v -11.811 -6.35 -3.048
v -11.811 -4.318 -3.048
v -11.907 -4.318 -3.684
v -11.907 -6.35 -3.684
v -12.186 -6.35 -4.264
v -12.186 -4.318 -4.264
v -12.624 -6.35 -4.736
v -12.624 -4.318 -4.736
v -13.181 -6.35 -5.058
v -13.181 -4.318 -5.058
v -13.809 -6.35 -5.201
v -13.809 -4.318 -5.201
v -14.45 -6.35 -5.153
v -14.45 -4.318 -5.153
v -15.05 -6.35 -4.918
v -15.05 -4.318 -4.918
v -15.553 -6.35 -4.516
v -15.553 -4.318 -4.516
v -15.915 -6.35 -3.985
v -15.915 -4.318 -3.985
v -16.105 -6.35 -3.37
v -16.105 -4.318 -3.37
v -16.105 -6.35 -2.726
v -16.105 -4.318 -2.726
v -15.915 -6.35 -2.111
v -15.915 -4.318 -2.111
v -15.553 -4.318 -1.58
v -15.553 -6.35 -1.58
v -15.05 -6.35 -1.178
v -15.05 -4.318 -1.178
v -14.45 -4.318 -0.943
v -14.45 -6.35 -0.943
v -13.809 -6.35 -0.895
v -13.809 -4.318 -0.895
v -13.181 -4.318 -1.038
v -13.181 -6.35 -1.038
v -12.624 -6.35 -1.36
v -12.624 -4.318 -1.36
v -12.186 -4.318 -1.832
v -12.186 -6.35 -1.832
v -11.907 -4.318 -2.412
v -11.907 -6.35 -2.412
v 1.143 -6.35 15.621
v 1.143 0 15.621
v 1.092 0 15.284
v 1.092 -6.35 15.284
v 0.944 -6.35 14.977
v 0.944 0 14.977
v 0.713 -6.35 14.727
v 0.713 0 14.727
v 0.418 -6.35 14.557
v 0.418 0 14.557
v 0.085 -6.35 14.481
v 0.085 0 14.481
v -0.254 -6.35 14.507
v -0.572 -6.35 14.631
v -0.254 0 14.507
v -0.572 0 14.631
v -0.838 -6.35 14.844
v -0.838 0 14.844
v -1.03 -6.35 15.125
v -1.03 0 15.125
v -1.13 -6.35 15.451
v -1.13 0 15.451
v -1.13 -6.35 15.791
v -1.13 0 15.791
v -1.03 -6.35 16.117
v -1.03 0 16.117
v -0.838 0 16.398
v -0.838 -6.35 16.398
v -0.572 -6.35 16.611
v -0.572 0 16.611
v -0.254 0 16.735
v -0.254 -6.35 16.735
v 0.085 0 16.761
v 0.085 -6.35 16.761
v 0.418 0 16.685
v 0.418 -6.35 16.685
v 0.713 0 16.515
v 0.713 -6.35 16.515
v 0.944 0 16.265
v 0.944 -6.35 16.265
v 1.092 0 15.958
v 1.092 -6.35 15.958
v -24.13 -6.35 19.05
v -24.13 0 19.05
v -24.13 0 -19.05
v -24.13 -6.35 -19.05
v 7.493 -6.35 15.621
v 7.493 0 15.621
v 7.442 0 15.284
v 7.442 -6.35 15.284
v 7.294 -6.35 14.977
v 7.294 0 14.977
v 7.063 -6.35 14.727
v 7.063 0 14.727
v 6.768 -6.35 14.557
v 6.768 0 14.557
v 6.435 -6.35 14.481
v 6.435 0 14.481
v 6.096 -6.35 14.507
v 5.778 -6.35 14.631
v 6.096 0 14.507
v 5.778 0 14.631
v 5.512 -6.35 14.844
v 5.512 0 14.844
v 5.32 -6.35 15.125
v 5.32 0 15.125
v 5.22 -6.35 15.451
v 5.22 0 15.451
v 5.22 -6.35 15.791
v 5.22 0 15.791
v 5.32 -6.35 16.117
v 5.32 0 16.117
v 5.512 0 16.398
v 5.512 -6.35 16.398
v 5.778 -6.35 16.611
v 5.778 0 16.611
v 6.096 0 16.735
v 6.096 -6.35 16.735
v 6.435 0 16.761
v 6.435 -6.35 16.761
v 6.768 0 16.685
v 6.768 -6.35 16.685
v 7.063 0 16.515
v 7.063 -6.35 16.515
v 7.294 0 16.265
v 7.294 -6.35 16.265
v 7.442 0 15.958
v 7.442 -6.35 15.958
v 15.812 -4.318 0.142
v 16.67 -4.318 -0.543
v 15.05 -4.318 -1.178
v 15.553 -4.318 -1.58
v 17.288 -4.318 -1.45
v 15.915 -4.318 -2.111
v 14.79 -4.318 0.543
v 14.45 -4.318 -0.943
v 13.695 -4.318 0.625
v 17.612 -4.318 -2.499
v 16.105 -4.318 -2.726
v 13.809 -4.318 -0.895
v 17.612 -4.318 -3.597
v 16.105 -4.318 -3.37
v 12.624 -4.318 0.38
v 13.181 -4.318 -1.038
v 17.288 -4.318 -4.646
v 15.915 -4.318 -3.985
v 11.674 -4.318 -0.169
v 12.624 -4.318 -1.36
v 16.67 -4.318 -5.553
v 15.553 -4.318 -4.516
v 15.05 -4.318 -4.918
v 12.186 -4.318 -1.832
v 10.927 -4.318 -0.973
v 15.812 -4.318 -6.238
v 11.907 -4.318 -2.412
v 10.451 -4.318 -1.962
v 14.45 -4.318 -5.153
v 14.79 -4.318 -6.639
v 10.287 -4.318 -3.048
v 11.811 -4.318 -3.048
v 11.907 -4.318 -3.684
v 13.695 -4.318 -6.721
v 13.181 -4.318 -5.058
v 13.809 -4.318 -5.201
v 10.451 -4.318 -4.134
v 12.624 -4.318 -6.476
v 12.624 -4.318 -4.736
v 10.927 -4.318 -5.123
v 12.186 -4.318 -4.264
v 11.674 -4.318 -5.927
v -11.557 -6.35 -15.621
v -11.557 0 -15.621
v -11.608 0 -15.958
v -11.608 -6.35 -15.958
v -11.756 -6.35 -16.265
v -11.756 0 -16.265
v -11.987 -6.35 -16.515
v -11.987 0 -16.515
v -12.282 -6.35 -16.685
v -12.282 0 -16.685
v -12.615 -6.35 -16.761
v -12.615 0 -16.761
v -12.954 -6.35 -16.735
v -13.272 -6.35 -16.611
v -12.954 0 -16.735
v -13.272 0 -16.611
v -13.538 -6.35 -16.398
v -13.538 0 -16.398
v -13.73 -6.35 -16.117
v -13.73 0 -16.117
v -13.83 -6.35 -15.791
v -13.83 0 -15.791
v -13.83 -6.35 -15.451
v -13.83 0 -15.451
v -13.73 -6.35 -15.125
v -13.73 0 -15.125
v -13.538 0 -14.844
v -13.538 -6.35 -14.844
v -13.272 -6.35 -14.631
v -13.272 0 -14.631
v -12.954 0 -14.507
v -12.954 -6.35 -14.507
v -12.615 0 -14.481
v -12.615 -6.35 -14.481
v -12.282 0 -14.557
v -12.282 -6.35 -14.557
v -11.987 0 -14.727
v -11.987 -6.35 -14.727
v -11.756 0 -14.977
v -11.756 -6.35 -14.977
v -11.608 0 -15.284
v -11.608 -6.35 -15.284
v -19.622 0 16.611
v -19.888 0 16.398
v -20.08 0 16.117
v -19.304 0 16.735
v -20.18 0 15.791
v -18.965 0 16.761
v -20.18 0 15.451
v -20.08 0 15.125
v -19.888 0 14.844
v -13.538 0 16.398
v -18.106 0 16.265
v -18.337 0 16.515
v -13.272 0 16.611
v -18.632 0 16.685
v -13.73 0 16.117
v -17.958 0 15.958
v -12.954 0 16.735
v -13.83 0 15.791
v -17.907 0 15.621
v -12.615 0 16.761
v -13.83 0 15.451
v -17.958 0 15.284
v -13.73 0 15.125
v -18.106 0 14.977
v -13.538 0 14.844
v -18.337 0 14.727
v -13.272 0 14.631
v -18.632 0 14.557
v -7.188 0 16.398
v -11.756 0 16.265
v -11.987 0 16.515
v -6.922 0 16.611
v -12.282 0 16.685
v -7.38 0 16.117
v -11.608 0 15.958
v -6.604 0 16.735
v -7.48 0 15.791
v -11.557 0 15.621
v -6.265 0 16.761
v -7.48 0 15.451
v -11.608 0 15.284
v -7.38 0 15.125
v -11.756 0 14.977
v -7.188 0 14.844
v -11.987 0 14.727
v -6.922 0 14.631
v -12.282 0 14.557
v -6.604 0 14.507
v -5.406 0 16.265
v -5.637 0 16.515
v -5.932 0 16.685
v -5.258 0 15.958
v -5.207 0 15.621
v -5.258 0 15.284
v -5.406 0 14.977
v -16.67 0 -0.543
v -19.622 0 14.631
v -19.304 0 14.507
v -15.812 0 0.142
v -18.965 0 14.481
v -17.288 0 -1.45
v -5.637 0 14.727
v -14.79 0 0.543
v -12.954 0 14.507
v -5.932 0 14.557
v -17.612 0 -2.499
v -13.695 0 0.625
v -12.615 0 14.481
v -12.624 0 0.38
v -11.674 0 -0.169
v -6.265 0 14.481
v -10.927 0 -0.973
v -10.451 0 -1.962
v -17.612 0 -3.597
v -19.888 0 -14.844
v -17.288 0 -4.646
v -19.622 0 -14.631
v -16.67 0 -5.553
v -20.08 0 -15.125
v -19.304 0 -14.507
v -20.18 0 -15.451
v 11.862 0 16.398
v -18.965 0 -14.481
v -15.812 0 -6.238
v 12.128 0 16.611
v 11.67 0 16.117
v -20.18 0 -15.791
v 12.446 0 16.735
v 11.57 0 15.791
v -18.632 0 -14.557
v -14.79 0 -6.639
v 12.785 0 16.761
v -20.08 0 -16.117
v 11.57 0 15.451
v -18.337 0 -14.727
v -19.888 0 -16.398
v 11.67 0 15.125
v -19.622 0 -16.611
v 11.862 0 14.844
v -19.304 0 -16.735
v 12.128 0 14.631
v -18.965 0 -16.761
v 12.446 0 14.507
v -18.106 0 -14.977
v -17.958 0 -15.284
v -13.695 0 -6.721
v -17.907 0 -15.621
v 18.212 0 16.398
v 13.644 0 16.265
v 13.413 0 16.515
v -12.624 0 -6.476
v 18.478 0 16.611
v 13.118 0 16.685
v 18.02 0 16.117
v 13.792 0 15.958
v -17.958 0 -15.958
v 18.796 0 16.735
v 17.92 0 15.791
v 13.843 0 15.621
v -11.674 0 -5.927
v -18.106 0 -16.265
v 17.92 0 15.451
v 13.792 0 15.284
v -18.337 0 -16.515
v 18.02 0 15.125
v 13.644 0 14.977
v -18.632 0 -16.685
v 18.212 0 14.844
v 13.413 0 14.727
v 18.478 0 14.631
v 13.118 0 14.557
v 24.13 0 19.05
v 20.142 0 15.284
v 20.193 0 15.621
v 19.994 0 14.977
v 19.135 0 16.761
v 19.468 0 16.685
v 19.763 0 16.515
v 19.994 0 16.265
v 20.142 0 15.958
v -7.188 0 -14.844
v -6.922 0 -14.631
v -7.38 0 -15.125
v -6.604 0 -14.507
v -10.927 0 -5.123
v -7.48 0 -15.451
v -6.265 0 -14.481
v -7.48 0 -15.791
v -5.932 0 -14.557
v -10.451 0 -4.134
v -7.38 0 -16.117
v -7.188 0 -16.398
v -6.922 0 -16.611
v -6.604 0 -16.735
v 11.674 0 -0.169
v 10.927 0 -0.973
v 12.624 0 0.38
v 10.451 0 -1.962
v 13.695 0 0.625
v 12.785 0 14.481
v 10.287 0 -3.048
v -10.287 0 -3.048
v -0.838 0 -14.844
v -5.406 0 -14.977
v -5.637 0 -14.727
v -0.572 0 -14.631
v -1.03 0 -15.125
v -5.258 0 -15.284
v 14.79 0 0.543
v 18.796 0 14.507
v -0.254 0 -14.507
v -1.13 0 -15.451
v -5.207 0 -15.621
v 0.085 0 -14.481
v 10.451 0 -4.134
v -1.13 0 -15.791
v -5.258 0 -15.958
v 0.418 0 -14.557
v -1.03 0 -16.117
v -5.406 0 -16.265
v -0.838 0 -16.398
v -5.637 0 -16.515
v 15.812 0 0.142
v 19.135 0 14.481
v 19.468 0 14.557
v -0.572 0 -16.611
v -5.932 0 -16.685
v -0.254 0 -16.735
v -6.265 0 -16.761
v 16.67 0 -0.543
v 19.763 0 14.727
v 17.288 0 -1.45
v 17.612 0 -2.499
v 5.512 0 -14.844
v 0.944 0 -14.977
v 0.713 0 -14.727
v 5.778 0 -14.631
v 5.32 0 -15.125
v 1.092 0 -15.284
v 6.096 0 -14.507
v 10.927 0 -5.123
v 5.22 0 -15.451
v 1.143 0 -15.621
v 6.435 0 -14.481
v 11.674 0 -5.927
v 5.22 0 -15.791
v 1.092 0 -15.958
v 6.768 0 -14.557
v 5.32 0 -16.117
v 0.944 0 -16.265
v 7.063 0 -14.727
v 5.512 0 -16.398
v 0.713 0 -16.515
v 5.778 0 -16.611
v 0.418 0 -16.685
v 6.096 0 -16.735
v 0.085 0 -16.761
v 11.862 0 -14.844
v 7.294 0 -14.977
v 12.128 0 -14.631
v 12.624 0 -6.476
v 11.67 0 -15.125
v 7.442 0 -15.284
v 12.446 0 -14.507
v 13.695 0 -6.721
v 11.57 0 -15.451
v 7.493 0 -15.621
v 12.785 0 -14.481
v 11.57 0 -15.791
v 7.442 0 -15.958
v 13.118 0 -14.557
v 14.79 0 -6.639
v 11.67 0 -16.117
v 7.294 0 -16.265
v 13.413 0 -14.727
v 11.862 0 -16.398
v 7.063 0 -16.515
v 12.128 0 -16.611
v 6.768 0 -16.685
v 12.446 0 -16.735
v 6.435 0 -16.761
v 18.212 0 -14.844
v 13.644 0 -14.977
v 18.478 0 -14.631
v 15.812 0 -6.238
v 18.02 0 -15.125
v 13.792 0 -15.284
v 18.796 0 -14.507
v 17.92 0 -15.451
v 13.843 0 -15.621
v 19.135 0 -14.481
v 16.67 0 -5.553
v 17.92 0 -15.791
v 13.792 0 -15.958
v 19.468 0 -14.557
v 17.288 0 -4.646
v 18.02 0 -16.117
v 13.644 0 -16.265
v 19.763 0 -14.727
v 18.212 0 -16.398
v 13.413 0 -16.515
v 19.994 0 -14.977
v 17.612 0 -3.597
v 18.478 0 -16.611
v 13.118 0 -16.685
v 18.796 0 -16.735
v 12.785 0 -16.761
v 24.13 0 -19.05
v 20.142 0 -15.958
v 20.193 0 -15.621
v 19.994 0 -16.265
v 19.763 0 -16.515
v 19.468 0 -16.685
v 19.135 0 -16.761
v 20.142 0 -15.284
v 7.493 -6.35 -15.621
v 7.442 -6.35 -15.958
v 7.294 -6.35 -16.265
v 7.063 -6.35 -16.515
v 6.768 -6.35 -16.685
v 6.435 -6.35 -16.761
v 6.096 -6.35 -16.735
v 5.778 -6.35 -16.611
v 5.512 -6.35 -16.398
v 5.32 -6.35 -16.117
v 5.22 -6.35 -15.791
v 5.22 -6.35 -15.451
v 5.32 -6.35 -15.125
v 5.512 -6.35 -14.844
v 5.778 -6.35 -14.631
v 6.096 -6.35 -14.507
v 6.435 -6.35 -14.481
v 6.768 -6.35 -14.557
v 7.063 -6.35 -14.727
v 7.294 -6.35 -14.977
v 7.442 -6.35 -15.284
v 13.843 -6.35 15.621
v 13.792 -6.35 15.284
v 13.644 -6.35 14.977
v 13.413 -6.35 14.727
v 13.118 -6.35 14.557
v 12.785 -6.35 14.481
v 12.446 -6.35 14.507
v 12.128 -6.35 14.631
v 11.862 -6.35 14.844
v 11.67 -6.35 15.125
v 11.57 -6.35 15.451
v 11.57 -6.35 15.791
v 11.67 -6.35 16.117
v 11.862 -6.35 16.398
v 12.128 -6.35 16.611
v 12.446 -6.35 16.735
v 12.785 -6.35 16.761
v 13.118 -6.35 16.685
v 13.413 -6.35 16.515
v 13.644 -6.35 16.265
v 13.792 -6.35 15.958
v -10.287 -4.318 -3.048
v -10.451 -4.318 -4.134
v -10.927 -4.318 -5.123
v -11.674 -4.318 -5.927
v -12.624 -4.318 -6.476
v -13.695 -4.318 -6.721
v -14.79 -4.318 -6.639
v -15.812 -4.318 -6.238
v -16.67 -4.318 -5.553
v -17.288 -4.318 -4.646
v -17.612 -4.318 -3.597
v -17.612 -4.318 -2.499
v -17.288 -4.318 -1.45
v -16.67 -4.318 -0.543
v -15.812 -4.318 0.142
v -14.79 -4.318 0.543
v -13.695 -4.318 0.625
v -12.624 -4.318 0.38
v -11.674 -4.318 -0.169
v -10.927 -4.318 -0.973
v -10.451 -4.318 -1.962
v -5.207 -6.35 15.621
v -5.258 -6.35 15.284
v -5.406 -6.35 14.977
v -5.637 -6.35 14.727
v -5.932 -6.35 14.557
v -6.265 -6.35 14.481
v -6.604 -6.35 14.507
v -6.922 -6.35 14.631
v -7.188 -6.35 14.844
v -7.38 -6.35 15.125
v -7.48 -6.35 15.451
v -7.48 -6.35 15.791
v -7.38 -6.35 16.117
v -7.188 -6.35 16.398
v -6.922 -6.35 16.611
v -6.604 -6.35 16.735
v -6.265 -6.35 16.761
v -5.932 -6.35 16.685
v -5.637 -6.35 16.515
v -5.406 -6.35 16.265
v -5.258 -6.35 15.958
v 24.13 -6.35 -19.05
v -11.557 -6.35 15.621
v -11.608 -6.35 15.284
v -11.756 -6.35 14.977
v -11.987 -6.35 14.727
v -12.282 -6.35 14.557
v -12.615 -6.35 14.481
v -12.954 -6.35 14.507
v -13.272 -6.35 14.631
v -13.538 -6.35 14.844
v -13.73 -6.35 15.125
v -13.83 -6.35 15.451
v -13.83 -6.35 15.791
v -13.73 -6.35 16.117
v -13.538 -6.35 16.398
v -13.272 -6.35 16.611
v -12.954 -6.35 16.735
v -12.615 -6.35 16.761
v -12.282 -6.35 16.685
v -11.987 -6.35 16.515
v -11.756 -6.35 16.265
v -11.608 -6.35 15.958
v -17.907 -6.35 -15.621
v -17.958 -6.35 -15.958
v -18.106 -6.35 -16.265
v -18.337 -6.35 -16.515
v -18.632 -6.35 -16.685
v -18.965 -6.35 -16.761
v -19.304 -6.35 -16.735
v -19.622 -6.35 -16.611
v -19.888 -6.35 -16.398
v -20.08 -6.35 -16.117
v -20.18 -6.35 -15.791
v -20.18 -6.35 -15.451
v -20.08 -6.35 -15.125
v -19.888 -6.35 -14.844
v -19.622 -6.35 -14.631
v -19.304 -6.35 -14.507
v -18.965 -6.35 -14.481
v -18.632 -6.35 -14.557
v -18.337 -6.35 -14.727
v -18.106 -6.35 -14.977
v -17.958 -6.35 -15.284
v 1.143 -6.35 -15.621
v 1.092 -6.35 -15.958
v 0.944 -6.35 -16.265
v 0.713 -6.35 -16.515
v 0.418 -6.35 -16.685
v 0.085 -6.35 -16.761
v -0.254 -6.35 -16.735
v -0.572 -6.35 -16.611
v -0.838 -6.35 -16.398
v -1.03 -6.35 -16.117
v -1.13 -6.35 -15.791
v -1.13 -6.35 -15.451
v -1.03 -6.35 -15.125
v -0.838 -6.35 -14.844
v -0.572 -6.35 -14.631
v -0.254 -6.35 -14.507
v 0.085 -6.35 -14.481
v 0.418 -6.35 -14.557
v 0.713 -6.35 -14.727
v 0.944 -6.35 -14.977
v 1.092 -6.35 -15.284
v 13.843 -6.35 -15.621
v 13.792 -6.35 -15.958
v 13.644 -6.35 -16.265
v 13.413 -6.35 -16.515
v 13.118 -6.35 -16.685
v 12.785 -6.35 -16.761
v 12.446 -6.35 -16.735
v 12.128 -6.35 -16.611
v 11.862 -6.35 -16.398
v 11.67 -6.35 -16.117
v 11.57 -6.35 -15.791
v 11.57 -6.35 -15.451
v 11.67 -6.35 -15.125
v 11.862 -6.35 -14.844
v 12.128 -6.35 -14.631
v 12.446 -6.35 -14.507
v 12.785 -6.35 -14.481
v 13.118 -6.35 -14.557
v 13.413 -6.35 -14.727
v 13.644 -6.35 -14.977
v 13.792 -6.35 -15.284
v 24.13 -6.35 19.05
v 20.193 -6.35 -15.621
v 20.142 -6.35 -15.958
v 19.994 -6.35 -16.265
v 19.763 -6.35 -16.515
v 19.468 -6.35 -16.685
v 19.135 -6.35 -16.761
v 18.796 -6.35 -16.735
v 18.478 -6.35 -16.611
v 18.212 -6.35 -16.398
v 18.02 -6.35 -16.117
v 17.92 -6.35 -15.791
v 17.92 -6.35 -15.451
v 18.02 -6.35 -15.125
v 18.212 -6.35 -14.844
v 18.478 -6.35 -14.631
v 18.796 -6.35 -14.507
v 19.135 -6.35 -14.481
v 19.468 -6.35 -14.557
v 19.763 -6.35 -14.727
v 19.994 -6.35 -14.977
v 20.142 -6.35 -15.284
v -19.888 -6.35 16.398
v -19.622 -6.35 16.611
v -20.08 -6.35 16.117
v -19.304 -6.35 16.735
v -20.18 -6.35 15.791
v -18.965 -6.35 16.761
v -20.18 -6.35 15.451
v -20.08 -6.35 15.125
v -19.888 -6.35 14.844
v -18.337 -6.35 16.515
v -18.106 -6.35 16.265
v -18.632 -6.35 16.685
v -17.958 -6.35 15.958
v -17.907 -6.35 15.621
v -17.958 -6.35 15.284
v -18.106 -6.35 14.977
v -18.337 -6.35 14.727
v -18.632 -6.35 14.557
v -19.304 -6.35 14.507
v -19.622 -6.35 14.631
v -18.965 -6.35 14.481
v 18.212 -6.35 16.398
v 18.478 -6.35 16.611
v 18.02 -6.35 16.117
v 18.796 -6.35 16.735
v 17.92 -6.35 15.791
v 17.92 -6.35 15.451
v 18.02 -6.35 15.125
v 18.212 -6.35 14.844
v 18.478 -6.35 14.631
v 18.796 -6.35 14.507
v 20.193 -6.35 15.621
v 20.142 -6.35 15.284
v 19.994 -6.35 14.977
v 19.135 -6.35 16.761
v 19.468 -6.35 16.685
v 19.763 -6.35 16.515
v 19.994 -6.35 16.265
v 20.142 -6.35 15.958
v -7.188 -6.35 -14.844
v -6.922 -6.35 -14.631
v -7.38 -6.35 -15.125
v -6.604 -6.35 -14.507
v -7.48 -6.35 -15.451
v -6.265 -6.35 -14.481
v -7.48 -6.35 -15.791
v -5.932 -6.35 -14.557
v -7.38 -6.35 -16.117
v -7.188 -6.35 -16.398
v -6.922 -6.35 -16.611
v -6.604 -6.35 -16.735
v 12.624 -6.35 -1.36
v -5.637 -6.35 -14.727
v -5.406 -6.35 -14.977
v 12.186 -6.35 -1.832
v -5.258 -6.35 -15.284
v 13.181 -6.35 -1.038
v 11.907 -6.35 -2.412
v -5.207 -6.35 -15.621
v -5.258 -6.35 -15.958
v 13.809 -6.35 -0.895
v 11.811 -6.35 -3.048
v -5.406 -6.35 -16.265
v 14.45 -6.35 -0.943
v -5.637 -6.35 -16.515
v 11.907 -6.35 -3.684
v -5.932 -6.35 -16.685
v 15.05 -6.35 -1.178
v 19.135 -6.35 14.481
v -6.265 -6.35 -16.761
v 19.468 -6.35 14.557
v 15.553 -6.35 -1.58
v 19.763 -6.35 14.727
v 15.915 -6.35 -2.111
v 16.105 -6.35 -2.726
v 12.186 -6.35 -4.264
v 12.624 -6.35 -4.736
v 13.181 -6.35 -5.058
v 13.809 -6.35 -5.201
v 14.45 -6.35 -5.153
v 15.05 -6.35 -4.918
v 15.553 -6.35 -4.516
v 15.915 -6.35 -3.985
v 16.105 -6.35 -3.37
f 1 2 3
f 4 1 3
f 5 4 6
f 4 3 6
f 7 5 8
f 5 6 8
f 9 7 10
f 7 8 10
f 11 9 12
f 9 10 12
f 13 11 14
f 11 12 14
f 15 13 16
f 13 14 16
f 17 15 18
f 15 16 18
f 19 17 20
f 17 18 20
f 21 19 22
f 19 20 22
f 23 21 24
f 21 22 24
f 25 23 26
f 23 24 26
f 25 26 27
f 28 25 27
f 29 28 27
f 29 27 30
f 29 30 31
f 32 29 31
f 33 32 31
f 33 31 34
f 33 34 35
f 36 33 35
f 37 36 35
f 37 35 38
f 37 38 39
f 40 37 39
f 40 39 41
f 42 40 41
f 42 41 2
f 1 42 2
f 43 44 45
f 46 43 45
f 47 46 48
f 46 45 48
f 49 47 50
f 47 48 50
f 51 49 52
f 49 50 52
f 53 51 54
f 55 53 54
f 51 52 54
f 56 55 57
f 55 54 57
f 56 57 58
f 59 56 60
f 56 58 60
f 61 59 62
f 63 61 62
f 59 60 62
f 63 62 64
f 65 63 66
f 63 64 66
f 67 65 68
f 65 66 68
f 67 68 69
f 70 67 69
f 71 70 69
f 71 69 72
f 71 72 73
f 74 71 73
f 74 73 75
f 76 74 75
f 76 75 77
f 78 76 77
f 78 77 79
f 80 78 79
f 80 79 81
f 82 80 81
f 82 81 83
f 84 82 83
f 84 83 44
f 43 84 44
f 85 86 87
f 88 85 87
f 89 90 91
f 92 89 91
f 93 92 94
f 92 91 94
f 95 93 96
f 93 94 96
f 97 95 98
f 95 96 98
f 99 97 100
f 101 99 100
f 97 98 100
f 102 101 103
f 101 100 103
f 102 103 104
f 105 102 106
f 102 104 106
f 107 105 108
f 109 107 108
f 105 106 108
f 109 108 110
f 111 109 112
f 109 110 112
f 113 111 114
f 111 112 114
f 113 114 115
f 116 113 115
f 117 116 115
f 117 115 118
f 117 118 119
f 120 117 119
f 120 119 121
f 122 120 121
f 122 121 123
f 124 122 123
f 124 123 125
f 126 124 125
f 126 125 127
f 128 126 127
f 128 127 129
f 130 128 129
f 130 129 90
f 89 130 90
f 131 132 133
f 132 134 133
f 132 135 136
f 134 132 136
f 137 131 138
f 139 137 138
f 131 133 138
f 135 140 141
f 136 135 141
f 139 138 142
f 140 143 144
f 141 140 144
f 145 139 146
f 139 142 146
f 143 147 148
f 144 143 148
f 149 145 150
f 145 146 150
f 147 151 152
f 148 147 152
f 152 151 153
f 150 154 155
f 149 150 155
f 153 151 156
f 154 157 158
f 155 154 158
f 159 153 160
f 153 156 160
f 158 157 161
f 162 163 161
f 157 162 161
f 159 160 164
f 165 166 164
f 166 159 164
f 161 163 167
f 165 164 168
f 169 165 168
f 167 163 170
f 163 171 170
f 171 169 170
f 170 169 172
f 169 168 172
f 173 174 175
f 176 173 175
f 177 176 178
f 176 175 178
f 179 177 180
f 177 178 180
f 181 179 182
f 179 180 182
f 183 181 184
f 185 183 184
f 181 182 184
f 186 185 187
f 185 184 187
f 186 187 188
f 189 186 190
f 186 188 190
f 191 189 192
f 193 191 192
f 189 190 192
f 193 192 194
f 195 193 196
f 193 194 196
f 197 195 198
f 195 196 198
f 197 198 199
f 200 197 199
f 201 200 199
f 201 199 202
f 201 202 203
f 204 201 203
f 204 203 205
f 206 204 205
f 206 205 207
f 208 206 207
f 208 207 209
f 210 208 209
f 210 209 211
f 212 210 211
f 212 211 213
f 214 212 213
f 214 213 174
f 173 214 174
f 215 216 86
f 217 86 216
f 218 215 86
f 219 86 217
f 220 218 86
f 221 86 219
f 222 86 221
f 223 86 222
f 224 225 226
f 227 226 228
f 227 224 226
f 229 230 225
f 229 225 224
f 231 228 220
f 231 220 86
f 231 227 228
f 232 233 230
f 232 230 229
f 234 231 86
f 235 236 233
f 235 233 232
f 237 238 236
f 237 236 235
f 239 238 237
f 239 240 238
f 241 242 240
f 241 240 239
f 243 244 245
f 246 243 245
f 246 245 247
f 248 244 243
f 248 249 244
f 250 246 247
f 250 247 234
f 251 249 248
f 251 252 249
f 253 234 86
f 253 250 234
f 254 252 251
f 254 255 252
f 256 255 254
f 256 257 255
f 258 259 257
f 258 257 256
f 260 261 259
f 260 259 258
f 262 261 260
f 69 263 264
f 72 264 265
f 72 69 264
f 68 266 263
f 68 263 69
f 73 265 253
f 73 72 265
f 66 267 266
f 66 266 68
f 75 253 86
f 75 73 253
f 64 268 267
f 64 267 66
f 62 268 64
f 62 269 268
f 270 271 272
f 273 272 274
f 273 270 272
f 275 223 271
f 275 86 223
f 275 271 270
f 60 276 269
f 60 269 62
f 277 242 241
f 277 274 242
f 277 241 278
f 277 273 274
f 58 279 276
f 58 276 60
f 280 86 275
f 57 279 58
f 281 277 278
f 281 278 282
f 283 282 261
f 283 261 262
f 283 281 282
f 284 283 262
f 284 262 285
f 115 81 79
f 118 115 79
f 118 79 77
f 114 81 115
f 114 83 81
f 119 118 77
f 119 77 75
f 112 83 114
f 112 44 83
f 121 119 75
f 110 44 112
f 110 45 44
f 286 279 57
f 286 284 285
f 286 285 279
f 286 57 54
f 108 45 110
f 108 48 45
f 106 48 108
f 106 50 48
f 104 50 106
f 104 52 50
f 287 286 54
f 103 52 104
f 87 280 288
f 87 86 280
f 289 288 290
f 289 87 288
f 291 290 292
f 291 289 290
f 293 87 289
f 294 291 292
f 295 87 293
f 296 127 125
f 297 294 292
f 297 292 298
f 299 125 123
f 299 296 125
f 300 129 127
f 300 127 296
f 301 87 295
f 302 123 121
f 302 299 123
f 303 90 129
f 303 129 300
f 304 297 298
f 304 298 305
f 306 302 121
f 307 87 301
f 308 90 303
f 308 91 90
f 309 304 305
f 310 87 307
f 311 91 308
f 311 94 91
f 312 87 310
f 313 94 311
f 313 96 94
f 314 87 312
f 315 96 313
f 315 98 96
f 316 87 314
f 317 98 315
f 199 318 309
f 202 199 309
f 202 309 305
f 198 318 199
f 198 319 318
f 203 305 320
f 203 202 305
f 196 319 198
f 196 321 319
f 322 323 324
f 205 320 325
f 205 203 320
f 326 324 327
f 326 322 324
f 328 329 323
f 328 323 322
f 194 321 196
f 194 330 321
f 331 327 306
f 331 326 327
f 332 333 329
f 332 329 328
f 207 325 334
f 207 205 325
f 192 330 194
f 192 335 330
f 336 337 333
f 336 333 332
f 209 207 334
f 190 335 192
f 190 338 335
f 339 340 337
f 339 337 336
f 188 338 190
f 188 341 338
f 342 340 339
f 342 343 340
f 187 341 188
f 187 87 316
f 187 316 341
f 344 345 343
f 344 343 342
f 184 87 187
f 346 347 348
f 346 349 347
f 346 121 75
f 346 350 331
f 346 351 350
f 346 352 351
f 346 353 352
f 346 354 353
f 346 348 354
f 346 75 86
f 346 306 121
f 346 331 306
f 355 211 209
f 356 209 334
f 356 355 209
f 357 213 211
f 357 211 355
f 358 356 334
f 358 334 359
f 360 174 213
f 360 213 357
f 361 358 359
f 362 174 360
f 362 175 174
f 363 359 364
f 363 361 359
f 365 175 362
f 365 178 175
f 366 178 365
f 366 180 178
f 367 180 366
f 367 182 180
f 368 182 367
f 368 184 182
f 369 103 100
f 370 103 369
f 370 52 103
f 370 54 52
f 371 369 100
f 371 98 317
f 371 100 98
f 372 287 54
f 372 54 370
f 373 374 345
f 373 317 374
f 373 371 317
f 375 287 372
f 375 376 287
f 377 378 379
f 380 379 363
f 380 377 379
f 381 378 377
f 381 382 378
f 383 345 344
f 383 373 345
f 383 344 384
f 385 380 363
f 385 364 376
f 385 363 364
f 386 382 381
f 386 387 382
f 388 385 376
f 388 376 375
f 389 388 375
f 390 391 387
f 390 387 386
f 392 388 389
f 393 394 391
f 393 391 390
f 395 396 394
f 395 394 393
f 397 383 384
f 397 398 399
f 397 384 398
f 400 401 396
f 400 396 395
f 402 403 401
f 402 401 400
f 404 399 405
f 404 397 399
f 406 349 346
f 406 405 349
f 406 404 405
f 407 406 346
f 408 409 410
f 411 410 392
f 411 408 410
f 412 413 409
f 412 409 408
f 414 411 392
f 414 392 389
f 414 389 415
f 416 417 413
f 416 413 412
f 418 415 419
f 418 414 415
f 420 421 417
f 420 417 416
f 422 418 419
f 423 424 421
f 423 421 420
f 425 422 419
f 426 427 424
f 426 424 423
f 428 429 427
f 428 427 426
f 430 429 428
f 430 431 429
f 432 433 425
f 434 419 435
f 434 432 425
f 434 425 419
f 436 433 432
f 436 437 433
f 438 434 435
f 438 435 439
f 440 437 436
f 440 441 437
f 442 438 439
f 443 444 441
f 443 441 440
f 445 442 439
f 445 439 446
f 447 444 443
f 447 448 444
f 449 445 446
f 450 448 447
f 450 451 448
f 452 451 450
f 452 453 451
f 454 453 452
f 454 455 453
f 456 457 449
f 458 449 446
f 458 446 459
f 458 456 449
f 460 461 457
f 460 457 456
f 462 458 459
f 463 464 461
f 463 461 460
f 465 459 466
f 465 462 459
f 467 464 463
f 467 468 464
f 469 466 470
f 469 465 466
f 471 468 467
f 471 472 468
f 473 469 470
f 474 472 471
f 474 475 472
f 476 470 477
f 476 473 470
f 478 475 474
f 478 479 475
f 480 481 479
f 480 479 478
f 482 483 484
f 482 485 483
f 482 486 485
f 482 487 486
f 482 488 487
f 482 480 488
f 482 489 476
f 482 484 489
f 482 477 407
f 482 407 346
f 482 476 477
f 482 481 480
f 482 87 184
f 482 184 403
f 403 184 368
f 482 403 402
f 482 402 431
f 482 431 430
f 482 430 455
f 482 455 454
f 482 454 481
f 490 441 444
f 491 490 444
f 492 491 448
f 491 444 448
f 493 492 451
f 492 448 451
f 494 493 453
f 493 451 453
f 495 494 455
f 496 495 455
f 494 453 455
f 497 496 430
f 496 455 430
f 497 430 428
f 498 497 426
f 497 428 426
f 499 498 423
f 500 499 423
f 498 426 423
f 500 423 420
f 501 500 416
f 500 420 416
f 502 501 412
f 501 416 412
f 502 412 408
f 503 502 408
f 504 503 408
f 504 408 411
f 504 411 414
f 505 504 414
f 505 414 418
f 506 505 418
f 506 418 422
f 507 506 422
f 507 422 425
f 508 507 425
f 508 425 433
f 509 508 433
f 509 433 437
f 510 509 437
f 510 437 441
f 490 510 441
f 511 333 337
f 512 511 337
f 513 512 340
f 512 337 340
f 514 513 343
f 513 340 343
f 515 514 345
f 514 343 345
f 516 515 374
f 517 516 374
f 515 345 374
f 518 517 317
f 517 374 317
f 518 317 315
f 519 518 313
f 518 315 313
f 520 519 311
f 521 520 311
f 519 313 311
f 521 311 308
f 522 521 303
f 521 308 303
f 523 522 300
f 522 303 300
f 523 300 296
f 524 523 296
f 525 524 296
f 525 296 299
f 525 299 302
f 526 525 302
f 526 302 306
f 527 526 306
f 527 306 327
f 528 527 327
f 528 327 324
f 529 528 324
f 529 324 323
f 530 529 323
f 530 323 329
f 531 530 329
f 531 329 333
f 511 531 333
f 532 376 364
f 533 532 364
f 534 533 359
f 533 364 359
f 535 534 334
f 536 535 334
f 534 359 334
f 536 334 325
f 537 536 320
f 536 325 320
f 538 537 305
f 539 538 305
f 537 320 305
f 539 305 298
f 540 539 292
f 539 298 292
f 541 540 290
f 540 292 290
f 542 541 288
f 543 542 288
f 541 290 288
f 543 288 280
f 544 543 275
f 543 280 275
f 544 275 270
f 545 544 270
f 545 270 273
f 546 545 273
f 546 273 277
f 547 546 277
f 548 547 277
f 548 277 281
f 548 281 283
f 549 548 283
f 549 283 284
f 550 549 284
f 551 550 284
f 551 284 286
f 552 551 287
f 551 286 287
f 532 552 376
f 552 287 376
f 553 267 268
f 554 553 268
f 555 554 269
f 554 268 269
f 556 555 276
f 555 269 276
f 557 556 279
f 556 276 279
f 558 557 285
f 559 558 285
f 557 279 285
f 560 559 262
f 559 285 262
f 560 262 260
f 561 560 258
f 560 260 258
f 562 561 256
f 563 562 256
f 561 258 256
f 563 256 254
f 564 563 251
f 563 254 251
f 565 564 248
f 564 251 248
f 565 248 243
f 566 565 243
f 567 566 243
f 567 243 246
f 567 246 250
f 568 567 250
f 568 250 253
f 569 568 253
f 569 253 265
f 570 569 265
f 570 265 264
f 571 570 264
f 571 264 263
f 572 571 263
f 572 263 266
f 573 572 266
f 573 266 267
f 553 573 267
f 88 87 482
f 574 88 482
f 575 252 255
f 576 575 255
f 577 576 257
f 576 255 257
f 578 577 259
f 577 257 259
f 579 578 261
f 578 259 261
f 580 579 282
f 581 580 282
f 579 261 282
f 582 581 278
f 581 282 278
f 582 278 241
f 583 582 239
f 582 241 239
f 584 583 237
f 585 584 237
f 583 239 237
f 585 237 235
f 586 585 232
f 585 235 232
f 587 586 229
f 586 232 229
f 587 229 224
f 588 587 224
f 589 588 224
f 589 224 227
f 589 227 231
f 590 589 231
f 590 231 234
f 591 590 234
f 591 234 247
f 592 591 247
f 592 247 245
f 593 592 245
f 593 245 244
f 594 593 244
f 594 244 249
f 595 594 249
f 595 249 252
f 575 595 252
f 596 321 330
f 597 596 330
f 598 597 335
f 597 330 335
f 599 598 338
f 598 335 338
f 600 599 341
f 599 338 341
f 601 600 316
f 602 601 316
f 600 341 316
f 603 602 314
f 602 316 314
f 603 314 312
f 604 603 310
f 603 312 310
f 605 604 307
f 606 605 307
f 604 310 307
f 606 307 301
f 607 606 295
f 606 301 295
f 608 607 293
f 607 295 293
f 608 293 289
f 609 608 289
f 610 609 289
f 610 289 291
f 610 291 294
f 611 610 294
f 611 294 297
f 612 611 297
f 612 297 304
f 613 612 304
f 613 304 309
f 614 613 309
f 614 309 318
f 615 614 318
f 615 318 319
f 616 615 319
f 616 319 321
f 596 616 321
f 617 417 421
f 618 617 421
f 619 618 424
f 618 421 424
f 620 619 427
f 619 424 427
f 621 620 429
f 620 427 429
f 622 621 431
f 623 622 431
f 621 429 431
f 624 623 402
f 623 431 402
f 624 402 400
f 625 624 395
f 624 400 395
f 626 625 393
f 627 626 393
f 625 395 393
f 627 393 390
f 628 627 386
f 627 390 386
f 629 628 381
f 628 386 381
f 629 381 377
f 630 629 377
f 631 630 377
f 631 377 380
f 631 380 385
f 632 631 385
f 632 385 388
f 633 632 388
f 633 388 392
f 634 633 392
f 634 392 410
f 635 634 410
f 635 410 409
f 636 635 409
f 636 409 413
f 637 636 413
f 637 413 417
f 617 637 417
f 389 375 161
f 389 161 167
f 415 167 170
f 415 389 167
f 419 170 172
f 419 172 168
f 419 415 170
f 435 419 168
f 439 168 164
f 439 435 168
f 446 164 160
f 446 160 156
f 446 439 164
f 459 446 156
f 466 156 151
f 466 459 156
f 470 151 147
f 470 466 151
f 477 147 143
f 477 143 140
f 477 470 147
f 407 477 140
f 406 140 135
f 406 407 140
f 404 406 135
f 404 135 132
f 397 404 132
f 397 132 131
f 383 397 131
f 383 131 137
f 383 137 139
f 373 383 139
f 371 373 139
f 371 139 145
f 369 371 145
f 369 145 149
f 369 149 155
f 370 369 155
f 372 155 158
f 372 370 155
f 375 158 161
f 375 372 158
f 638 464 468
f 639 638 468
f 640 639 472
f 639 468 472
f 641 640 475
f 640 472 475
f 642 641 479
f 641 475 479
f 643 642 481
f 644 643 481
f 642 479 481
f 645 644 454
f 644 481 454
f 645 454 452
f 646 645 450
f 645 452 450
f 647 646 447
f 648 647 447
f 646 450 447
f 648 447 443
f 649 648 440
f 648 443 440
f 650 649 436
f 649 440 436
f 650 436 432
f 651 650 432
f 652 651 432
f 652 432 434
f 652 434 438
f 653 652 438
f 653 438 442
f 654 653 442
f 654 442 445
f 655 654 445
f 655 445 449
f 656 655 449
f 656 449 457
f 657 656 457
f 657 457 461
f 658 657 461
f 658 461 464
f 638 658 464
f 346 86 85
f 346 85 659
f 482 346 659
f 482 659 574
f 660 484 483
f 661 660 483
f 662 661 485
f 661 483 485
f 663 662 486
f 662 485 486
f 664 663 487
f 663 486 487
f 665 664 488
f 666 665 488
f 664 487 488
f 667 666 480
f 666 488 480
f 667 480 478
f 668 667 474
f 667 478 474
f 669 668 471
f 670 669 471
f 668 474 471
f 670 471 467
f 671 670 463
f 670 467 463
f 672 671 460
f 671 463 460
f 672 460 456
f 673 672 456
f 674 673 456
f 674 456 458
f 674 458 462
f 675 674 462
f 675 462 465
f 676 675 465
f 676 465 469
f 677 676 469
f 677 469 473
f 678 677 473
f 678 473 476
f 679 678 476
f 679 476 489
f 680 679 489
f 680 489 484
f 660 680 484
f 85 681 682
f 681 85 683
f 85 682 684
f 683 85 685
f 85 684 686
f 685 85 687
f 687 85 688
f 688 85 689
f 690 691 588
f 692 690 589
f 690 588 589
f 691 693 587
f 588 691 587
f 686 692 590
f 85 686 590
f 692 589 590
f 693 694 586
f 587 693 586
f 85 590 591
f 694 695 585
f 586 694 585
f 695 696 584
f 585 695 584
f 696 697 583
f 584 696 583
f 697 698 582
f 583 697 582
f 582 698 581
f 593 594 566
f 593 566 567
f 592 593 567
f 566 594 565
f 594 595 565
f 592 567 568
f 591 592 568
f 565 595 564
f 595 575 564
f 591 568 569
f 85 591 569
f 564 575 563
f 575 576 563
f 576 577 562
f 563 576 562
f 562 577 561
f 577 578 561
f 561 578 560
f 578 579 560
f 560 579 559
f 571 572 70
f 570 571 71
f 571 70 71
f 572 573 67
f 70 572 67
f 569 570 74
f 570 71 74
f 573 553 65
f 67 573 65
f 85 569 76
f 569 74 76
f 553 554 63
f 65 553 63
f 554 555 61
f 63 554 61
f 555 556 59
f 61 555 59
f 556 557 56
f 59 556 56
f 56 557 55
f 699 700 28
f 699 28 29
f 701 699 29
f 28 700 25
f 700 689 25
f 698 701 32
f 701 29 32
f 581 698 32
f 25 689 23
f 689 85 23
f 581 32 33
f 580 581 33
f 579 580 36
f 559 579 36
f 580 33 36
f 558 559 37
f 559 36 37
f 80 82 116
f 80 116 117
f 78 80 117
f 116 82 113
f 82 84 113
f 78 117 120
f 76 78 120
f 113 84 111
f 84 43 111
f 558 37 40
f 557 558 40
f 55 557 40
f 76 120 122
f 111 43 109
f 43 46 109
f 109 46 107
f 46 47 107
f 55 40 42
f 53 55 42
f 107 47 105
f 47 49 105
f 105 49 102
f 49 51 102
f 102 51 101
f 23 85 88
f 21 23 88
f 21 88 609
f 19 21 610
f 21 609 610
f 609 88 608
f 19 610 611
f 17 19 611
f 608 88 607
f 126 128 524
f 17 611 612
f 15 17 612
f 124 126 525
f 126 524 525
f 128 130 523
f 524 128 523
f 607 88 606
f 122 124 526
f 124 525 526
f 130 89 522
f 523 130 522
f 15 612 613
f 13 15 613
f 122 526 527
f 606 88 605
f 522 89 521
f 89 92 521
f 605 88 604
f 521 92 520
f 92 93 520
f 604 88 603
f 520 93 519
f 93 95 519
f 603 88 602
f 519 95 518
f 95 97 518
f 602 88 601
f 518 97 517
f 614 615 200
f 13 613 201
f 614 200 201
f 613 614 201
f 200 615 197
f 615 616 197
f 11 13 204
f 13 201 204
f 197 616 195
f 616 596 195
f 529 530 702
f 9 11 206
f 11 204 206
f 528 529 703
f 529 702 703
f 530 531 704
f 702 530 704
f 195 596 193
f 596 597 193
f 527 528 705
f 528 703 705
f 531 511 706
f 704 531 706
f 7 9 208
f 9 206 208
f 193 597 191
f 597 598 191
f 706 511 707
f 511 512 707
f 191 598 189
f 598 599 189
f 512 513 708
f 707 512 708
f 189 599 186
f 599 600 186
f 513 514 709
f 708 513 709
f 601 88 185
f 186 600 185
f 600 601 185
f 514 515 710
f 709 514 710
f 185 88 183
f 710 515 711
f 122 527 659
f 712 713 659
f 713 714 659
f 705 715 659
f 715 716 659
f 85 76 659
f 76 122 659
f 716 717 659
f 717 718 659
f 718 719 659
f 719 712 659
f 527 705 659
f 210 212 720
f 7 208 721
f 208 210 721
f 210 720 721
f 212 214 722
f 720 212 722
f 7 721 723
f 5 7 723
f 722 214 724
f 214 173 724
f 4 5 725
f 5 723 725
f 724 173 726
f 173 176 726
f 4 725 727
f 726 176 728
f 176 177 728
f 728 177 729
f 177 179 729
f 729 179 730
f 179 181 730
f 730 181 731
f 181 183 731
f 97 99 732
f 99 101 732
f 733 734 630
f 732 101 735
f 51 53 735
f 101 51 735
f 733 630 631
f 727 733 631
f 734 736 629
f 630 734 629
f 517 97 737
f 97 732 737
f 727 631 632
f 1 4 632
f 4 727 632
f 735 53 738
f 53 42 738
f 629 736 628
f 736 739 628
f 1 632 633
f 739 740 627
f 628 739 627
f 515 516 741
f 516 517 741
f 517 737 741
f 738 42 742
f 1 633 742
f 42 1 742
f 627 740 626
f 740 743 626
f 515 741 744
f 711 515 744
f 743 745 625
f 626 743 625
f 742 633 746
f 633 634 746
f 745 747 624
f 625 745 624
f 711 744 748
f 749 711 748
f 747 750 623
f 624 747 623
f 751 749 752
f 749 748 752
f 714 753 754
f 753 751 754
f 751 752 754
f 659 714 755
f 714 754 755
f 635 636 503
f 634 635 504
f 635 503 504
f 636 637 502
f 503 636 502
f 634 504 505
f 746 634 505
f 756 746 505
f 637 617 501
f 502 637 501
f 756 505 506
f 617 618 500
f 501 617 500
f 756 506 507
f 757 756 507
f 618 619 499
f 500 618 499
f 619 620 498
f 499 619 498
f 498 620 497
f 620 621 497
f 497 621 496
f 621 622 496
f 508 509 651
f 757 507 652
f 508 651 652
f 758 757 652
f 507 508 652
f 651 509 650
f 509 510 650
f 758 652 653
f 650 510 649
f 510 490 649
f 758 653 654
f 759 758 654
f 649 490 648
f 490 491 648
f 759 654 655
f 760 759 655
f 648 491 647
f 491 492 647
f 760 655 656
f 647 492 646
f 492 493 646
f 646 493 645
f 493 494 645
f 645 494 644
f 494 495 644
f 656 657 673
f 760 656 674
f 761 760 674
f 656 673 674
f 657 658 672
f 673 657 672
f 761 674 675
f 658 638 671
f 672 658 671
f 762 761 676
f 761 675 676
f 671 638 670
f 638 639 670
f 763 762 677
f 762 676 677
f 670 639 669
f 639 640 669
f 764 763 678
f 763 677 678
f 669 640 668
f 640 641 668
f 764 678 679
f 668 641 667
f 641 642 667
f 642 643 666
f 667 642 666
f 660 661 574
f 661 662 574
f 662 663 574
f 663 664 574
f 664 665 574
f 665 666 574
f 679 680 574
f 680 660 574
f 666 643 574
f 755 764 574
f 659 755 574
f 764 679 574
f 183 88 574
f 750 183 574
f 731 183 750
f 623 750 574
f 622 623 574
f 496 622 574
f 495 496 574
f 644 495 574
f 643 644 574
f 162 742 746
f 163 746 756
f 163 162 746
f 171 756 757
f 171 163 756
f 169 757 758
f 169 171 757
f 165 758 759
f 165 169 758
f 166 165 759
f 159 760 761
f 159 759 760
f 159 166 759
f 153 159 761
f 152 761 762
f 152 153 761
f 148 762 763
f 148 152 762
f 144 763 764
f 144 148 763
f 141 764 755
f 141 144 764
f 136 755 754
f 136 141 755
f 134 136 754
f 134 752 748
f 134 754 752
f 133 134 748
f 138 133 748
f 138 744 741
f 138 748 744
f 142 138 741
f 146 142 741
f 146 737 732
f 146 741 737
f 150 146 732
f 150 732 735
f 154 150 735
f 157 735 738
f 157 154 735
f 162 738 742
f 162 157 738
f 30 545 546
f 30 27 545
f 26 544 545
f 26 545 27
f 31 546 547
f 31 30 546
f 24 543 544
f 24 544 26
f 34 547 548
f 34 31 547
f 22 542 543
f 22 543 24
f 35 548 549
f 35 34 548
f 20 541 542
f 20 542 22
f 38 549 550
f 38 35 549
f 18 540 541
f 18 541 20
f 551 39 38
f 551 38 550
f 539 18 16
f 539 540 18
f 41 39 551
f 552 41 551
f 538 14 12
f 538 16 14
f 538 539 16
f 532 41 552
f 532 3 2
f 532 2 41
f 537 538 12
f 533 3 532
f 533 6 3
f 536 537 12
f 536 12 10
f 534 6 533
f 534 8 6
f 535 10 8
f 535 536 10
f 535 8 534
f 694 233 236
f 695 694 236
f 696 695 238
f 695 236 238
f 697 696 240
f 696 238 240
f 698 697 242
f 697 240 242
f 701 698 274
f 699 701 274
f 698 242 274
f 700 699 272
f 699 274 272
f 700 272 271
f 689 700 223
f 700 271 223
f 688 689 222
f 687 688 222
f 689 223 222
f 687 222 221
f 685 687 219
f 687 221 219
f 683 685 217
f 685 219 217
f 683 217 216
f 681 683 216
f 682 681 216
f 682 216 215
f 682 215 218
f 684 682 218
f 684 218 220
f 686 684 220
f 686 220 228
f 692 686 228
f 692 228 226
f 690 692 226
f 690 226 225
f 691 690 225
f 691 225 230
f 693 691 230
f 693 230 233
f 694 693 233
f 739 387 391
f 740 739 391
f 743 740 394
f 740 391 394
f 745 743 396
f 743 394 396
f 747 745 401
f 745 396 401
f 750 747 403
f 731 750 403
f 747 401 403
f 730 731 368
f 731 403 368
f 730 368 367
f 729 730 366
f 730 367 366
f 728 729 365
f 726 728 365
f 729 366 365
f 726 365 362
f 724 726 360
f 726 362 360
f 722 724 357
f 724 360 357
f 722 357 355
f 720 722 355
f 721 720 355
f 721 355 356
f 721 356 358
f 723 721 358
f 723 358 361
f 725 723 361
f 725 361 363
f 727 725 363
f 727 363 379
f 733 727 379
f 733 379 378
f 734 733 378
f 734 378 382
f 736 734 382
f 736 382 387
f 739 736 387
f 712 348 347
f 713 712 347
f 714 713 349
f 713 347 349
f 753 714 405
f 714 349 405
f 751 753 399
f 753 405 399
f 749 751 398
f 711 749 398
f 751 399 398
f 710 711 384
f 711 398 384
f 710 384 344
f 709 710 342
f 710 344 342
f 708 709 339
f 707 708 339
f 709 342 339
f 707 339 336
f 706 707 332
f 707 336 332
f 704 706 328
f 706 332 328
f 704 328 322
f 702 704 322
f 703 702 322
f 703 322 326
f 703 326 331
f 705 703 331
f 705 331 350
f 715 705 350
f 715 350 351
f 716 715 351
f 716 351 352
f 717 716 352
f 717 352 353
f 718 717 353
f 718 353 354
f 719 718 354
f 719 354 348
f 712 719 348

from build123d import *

# Parameters (mm, degrees)
SKETCH1_W           = 48.26
SKETCH1_H           = 38.1
BOSS_EXTRUDE1_DEPTH = 6.35
SKETCH2_R           = 3.683
CUT_EXTRUDE1_DEPTH  = 4.318
SKETCH3_R           = 2.159
CUT_EXTRUDE2_DEPTH  = 4.318
SKETCH4_R           = 1.143
CUT_EXTRUDE3_DEPTH  = 9.398
LPATTERN1_COUNT     = 7
LPATTERN1_PITCH     = 6.35


with BuildPart() as part:
    # Sketch1 → Boss-Extrude1 (new body)
    with BuildSketch(Plane(origin=(0, 0, 0), x_dir=(1, 0, 0), z_dir=(0, 1, 0))):
        Rectangle(SKETCH1_W, SKETCH1_H)
    extrude(amount=-BOSS_EXTRUDE1_DEPTH)

    # Sketch2 → Cut-Extrude1 (cut)
    with BuildSketch(Plane(origin=(0, 0, 0), x_dir=(1, 0, 0), z_dir=(0, 1, 0))):
        with Locations((-13.97, 3.048)):
            Circle(SKETCH2_R)
    cut_extrude1 = extrude(amount=-CUT_EXTRUDE1_DEPTH, mode=Mode.SUBTRACT)

    # Sketch3 → Cut-Extrude2 (cut)
    with BuildSketch(Plane(origin=(0, -4.318, 0), x_dir=(1, 0, 0), z_dir=(0, 1, 0))):
        with Locations((-13.97, 3.048)):
            Circle(SKETCH3_R)
    cut_extrude2 = extrude(amount=-CUT_EXTRUDE2_DEPTH, mode=Mode.SUBTRACT)

    # Sketch4 → Cut-Extrude3 (cut)
    with BuildSketch(Plane(origin=(0, 0, 0), x_dir=(1, 0, 0), z_dir=(0, 1, 0))):
        with Locations((-19.05, 15.621)):
            Circle(SKETCH4_R)
        with Locations((-19.05, -15.621)):
            Circle(SKETCH4_R)
    cut_extrude3 = extrude(amount=-CUT_EXTRUDE3_DEPTH, mode=Mode.SUBTRACT)

    # LPattern1: Cut-Extrude3 ×7
    with Locations(*[(i * LPATTERN1_PITCH, 0, 0) for i in range(1, LPATTERN1_COUNT)]):
        add(cut_extrude3, mode=Mode.SUBTRACT)

    # Mirror1: Cut-Extrude1, Cut-Extrude2 across plane
    add(cut_extrude1.mirror(Plane(origin=(0, 0, 0), x_dir=(0, 0, 1), z_dir=(1, 0, 0))), mode=Mode.SUBTRACT)
    add(cut_extrude2.mirror(Plane(origin=(0, 0, 0), x_dir=(0, 0, 1), z_dir=(1, 0, 0))), mode=Mode.SUBTRACT)


solid = part.part
